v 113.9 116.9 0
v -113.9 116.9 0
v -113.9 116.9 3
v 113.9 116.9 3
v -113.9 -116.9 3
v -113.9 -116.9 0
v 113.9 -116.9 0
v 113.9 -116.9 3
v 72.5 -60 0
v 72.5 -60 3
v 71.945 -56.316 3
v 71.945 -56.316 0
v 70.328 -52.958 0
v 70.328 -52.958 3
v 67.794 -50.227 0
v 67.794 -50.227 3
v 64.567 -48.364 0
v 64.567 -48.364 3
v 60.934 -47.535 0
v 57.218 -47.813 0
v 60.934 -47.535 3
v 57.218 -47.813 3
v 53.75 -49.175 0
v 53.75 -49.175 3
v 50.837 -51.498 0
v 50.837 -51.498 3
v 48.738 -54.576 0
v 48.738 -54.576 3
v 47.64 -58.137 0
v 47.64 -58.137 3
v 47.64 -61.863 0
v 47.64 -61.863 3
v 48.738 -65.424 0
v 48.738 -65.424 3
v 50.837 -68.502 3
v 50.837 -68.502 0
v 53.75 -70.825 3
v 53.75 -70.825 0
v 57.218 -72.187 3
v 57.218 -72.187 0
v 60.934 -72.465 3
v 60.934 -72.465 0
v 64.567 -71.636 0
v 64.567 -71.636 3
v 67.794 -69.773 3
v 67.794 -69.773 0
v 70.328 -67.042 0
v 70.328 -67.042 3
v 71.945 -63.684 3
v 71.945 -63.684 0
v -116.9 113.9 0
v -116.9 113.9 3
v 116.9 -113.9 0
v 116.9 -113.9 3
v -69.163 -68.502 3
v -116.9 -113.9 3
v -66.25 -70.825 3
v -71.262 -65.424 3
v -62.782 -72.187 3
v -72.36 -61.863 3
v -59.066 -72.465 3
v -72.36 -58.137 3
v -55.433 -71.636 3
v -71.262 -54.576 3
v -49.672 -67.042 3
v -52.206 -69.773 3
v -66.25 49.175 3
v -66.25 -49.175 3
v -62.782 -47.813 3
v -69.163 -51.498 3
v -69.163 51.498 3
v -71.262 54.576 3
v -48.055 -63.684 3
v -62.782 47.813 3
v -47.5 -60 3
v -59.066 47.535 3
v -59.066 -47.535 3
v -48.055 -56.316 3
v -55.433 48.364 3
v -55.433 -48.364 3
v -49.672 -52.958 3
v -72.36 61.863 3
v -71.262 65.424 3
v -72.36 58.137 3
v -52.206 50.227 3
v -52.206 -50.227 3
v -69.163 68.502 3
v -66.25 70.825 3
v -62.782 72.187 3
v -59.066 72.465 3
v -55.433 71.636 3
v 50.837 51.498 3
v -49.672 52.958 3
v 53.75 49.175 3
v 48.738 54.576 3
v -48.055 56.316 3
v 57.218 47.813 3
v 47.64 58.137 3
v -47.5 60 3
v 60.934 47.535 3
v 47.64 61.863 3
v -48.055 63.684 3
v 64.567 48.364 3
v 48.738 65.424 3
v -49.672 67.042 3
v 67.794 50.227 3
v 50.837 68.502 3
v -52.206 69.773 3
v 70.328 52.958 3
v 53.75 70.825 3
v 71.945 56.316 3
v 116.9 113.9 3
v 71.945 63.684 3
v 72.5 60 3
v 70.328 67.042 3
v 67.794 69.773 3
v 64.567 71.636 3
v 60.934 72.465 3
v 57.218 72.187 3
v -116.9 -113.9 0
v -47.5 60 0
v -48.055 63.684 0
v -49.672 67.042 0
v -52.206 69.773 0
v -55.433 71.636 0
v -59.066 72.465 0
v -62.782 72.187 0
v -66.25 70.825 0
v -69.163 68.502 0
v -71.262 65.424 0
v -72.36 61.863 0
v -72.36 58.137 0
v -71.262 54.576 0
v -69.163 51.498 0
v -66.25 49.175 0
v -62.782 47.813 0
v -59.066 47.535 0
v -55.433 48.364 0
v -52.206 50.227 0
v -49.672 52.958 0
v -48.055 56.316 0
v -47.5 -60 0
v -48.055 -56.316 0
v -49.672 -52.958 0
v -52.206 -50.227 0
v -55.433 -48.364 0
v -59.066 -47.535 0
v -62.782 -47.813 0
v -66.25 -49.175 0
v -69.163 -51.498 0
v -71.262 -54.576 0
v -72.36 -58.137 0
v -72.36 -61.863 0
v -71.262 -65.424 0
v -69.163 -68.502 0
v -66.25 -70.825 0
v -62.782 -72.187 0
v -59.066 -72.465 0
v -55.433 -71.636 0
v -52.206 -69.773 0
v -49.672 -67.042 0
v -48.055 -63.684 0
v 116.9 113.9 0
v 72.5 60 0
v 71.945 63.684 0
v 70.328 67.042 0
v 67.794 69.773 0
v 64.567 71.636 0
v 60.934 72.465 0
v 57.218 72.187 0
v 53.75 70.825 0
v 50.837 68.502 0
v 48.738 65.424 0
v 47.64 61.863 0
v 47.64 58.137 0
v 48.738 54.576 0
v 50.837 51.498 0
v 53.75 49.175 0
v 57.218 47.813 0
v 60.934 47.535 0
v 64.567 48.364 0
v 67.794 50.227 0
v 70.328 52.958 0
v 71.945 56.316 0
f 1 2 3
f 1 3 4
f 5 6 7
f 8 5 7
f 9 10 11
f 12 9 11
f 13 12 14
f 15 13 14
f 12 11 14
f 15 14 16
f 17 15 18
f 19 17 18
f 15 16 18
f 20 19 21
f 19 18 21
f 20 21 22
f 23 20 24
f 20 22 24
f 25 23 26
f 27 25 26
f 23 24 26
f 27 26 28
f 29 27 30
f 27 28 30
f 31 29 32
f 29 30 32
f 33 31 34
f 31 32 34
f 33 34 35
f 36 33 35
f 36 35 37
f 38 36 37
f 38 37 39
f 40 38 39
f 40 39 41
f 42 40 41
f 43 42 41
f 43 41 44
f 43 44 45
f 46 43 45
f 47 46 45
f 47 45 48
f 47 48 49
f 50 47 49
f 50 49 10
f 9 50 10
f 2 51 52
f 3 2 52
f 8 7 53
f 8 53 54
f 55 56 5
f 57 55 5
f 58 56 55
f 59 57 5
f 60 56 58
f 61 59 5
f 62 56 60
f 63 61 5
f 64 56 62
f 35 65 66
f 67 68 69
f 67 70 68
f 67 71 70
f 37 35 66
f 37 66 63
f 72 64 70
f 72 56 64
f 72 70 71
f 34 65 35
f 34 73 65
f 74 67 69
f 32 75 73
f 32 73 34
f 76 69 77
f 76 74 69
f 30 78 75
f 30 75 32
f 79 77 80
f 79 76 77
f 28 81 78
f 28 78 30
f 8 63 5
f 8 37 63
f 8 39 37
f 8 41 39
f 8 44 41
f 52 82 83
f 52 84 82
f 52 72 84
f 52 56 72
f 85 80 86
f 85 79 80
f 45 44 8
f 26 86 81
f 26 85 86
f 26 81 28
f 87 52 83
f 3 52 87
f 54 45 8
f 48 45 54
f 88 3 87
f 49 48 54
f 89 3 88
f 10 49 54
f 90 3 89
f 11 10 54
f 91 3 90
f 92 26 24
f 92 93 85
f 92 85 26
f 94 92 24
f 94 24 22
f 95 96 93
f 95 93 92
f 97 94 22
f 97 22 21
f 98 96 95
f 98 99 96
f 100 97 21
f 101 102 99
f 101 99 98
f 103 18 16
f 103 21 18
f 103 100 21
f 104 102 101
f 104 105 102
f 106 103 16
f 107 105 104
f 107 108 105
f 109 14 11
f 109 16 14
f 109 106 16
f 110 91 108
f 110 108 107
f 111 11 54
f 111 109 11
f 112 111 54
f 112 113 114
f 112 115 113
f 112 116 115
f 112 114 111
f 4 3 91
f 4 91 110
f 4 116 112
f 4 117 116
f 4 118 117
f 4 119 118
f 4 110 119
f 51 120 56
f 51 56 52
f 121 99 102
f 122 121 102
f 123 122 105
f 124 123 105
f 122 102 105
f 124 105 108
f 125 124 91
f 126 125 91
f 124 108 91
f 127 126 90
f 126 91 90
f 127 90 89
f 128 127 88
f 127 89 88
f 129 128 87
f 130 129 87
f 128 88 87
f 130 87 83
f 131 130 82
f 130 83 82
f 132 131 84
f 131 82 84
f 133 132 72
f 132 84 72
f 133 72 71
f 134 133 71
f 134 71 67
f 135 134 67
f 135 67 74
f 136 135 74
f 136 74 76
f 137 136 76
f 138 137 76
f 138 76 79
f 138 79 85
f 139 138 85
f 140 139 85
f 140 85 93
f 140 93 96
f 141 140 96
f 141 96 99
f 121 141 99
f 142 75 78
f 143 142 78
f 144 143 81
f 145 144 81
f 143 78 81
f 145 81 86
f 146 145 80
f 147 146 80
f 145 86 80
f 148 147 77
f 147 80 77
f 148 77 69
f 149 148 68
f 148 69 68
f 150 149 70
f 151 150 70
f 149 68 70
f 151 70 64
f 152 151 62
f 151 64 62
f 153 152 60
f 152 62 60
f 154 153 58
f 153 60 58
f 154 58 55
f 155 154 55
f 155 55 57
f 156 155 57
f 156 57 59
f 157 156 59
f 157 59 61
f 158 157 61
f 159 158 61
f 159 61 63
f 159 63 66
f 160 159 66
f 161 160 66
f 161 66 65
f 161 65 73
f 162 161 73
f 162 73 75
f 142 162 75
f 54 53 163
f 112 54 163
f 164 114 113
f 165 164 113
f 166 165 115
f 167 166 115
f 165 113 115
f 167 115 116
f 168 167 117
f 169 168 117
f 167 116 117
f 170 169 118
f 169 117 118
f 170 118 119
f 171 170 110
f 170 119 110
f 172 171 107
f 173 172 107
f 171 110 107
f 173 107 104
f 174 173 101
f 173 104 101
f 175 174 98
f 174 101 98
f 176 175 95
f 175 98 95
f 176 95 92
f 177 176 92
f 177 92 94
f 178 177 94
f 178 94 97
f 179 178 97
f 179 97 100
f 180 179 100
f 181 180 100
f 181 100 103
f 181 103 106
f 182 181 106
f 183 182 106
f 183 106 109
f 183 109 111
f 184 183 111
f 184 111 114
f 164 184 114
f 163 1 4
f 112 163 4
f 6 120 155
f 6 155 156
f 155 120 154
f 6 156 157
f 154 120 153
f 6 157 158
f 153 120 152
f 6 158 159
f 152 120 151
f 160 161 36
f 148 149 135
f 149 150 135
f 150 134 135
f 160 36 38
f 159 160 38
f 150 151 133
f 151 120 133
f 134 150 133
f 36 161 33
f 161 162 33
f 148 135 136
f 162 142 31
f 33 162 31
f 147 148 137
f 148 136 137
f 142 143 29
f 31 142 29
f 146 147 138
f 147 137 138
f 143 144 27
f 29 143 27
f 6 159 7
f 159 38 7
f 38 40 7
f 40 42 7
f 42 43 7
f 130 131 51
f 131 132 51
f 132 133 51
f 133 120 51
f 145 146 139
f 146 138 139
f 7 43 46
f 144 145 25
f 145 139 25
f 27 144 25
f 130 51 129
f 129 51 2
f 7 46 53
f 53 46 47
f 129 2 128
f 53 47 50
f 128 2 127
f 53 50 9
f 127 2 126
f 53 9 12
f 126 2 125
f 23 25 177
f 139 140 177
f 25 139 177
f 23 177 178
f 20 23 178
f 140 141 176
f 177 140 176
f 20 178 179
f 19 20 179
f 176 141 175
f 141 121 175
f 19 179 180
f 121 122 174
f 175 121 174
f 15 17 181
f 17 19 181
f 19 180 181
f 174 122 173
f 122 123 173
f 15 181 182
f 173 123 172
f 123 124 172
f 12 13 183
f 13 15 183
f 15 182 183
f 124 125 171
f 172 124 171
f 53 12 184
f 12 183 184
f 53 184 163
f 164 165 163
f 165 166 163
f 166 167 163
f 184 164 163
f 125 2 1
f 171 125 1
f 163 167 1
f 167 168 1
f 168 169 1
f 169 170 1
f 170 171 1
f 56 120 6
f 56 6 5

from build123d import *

# Parameters (mm, degrees)
F0_W     = 233.8
F0_H     = 233.8
F1_DEPTH = 3
F2_R     = 12.5
F3_DEPTH = 3.001
F4_SIZE  = 3


with BuildPart() as f1:
    # F0 (on Top) → F1 (new body)
    with BuildSketch(Plane.XY):
        Rectangle(F0_W, F0_H)
    extrude(amount=F1_DEPTH)

    # F2 (on face) → F3 (cut, through all)
    with BuildSketch(Plane.XY.offset(3)):
        with Locations((-60, 60)):
            Circle(F2_R)
        with Locations((-60, -60)):
            Circle(F2_R)
        with Locations((60, -60)):
            Circle(F2_R)
        with Locations((60, 60)):
            Circle(F2_R)
    extrude(amount=-F3_DEPTH, mode=Mode.SUBTRACT)

    # F4
    f4_edges = [f1.edges().sort_by_distance(p)[0] for p in [
        (116.9, 116.9, 1.5),
        (-116.9, 116.9, 1.5),
        (116.9, -116.9, 1.5),
        (-116.9, -116.9, 1.5),
    ]]
    chamfer(f4_edges, length=F4_SIZE)


solid = f1.part
